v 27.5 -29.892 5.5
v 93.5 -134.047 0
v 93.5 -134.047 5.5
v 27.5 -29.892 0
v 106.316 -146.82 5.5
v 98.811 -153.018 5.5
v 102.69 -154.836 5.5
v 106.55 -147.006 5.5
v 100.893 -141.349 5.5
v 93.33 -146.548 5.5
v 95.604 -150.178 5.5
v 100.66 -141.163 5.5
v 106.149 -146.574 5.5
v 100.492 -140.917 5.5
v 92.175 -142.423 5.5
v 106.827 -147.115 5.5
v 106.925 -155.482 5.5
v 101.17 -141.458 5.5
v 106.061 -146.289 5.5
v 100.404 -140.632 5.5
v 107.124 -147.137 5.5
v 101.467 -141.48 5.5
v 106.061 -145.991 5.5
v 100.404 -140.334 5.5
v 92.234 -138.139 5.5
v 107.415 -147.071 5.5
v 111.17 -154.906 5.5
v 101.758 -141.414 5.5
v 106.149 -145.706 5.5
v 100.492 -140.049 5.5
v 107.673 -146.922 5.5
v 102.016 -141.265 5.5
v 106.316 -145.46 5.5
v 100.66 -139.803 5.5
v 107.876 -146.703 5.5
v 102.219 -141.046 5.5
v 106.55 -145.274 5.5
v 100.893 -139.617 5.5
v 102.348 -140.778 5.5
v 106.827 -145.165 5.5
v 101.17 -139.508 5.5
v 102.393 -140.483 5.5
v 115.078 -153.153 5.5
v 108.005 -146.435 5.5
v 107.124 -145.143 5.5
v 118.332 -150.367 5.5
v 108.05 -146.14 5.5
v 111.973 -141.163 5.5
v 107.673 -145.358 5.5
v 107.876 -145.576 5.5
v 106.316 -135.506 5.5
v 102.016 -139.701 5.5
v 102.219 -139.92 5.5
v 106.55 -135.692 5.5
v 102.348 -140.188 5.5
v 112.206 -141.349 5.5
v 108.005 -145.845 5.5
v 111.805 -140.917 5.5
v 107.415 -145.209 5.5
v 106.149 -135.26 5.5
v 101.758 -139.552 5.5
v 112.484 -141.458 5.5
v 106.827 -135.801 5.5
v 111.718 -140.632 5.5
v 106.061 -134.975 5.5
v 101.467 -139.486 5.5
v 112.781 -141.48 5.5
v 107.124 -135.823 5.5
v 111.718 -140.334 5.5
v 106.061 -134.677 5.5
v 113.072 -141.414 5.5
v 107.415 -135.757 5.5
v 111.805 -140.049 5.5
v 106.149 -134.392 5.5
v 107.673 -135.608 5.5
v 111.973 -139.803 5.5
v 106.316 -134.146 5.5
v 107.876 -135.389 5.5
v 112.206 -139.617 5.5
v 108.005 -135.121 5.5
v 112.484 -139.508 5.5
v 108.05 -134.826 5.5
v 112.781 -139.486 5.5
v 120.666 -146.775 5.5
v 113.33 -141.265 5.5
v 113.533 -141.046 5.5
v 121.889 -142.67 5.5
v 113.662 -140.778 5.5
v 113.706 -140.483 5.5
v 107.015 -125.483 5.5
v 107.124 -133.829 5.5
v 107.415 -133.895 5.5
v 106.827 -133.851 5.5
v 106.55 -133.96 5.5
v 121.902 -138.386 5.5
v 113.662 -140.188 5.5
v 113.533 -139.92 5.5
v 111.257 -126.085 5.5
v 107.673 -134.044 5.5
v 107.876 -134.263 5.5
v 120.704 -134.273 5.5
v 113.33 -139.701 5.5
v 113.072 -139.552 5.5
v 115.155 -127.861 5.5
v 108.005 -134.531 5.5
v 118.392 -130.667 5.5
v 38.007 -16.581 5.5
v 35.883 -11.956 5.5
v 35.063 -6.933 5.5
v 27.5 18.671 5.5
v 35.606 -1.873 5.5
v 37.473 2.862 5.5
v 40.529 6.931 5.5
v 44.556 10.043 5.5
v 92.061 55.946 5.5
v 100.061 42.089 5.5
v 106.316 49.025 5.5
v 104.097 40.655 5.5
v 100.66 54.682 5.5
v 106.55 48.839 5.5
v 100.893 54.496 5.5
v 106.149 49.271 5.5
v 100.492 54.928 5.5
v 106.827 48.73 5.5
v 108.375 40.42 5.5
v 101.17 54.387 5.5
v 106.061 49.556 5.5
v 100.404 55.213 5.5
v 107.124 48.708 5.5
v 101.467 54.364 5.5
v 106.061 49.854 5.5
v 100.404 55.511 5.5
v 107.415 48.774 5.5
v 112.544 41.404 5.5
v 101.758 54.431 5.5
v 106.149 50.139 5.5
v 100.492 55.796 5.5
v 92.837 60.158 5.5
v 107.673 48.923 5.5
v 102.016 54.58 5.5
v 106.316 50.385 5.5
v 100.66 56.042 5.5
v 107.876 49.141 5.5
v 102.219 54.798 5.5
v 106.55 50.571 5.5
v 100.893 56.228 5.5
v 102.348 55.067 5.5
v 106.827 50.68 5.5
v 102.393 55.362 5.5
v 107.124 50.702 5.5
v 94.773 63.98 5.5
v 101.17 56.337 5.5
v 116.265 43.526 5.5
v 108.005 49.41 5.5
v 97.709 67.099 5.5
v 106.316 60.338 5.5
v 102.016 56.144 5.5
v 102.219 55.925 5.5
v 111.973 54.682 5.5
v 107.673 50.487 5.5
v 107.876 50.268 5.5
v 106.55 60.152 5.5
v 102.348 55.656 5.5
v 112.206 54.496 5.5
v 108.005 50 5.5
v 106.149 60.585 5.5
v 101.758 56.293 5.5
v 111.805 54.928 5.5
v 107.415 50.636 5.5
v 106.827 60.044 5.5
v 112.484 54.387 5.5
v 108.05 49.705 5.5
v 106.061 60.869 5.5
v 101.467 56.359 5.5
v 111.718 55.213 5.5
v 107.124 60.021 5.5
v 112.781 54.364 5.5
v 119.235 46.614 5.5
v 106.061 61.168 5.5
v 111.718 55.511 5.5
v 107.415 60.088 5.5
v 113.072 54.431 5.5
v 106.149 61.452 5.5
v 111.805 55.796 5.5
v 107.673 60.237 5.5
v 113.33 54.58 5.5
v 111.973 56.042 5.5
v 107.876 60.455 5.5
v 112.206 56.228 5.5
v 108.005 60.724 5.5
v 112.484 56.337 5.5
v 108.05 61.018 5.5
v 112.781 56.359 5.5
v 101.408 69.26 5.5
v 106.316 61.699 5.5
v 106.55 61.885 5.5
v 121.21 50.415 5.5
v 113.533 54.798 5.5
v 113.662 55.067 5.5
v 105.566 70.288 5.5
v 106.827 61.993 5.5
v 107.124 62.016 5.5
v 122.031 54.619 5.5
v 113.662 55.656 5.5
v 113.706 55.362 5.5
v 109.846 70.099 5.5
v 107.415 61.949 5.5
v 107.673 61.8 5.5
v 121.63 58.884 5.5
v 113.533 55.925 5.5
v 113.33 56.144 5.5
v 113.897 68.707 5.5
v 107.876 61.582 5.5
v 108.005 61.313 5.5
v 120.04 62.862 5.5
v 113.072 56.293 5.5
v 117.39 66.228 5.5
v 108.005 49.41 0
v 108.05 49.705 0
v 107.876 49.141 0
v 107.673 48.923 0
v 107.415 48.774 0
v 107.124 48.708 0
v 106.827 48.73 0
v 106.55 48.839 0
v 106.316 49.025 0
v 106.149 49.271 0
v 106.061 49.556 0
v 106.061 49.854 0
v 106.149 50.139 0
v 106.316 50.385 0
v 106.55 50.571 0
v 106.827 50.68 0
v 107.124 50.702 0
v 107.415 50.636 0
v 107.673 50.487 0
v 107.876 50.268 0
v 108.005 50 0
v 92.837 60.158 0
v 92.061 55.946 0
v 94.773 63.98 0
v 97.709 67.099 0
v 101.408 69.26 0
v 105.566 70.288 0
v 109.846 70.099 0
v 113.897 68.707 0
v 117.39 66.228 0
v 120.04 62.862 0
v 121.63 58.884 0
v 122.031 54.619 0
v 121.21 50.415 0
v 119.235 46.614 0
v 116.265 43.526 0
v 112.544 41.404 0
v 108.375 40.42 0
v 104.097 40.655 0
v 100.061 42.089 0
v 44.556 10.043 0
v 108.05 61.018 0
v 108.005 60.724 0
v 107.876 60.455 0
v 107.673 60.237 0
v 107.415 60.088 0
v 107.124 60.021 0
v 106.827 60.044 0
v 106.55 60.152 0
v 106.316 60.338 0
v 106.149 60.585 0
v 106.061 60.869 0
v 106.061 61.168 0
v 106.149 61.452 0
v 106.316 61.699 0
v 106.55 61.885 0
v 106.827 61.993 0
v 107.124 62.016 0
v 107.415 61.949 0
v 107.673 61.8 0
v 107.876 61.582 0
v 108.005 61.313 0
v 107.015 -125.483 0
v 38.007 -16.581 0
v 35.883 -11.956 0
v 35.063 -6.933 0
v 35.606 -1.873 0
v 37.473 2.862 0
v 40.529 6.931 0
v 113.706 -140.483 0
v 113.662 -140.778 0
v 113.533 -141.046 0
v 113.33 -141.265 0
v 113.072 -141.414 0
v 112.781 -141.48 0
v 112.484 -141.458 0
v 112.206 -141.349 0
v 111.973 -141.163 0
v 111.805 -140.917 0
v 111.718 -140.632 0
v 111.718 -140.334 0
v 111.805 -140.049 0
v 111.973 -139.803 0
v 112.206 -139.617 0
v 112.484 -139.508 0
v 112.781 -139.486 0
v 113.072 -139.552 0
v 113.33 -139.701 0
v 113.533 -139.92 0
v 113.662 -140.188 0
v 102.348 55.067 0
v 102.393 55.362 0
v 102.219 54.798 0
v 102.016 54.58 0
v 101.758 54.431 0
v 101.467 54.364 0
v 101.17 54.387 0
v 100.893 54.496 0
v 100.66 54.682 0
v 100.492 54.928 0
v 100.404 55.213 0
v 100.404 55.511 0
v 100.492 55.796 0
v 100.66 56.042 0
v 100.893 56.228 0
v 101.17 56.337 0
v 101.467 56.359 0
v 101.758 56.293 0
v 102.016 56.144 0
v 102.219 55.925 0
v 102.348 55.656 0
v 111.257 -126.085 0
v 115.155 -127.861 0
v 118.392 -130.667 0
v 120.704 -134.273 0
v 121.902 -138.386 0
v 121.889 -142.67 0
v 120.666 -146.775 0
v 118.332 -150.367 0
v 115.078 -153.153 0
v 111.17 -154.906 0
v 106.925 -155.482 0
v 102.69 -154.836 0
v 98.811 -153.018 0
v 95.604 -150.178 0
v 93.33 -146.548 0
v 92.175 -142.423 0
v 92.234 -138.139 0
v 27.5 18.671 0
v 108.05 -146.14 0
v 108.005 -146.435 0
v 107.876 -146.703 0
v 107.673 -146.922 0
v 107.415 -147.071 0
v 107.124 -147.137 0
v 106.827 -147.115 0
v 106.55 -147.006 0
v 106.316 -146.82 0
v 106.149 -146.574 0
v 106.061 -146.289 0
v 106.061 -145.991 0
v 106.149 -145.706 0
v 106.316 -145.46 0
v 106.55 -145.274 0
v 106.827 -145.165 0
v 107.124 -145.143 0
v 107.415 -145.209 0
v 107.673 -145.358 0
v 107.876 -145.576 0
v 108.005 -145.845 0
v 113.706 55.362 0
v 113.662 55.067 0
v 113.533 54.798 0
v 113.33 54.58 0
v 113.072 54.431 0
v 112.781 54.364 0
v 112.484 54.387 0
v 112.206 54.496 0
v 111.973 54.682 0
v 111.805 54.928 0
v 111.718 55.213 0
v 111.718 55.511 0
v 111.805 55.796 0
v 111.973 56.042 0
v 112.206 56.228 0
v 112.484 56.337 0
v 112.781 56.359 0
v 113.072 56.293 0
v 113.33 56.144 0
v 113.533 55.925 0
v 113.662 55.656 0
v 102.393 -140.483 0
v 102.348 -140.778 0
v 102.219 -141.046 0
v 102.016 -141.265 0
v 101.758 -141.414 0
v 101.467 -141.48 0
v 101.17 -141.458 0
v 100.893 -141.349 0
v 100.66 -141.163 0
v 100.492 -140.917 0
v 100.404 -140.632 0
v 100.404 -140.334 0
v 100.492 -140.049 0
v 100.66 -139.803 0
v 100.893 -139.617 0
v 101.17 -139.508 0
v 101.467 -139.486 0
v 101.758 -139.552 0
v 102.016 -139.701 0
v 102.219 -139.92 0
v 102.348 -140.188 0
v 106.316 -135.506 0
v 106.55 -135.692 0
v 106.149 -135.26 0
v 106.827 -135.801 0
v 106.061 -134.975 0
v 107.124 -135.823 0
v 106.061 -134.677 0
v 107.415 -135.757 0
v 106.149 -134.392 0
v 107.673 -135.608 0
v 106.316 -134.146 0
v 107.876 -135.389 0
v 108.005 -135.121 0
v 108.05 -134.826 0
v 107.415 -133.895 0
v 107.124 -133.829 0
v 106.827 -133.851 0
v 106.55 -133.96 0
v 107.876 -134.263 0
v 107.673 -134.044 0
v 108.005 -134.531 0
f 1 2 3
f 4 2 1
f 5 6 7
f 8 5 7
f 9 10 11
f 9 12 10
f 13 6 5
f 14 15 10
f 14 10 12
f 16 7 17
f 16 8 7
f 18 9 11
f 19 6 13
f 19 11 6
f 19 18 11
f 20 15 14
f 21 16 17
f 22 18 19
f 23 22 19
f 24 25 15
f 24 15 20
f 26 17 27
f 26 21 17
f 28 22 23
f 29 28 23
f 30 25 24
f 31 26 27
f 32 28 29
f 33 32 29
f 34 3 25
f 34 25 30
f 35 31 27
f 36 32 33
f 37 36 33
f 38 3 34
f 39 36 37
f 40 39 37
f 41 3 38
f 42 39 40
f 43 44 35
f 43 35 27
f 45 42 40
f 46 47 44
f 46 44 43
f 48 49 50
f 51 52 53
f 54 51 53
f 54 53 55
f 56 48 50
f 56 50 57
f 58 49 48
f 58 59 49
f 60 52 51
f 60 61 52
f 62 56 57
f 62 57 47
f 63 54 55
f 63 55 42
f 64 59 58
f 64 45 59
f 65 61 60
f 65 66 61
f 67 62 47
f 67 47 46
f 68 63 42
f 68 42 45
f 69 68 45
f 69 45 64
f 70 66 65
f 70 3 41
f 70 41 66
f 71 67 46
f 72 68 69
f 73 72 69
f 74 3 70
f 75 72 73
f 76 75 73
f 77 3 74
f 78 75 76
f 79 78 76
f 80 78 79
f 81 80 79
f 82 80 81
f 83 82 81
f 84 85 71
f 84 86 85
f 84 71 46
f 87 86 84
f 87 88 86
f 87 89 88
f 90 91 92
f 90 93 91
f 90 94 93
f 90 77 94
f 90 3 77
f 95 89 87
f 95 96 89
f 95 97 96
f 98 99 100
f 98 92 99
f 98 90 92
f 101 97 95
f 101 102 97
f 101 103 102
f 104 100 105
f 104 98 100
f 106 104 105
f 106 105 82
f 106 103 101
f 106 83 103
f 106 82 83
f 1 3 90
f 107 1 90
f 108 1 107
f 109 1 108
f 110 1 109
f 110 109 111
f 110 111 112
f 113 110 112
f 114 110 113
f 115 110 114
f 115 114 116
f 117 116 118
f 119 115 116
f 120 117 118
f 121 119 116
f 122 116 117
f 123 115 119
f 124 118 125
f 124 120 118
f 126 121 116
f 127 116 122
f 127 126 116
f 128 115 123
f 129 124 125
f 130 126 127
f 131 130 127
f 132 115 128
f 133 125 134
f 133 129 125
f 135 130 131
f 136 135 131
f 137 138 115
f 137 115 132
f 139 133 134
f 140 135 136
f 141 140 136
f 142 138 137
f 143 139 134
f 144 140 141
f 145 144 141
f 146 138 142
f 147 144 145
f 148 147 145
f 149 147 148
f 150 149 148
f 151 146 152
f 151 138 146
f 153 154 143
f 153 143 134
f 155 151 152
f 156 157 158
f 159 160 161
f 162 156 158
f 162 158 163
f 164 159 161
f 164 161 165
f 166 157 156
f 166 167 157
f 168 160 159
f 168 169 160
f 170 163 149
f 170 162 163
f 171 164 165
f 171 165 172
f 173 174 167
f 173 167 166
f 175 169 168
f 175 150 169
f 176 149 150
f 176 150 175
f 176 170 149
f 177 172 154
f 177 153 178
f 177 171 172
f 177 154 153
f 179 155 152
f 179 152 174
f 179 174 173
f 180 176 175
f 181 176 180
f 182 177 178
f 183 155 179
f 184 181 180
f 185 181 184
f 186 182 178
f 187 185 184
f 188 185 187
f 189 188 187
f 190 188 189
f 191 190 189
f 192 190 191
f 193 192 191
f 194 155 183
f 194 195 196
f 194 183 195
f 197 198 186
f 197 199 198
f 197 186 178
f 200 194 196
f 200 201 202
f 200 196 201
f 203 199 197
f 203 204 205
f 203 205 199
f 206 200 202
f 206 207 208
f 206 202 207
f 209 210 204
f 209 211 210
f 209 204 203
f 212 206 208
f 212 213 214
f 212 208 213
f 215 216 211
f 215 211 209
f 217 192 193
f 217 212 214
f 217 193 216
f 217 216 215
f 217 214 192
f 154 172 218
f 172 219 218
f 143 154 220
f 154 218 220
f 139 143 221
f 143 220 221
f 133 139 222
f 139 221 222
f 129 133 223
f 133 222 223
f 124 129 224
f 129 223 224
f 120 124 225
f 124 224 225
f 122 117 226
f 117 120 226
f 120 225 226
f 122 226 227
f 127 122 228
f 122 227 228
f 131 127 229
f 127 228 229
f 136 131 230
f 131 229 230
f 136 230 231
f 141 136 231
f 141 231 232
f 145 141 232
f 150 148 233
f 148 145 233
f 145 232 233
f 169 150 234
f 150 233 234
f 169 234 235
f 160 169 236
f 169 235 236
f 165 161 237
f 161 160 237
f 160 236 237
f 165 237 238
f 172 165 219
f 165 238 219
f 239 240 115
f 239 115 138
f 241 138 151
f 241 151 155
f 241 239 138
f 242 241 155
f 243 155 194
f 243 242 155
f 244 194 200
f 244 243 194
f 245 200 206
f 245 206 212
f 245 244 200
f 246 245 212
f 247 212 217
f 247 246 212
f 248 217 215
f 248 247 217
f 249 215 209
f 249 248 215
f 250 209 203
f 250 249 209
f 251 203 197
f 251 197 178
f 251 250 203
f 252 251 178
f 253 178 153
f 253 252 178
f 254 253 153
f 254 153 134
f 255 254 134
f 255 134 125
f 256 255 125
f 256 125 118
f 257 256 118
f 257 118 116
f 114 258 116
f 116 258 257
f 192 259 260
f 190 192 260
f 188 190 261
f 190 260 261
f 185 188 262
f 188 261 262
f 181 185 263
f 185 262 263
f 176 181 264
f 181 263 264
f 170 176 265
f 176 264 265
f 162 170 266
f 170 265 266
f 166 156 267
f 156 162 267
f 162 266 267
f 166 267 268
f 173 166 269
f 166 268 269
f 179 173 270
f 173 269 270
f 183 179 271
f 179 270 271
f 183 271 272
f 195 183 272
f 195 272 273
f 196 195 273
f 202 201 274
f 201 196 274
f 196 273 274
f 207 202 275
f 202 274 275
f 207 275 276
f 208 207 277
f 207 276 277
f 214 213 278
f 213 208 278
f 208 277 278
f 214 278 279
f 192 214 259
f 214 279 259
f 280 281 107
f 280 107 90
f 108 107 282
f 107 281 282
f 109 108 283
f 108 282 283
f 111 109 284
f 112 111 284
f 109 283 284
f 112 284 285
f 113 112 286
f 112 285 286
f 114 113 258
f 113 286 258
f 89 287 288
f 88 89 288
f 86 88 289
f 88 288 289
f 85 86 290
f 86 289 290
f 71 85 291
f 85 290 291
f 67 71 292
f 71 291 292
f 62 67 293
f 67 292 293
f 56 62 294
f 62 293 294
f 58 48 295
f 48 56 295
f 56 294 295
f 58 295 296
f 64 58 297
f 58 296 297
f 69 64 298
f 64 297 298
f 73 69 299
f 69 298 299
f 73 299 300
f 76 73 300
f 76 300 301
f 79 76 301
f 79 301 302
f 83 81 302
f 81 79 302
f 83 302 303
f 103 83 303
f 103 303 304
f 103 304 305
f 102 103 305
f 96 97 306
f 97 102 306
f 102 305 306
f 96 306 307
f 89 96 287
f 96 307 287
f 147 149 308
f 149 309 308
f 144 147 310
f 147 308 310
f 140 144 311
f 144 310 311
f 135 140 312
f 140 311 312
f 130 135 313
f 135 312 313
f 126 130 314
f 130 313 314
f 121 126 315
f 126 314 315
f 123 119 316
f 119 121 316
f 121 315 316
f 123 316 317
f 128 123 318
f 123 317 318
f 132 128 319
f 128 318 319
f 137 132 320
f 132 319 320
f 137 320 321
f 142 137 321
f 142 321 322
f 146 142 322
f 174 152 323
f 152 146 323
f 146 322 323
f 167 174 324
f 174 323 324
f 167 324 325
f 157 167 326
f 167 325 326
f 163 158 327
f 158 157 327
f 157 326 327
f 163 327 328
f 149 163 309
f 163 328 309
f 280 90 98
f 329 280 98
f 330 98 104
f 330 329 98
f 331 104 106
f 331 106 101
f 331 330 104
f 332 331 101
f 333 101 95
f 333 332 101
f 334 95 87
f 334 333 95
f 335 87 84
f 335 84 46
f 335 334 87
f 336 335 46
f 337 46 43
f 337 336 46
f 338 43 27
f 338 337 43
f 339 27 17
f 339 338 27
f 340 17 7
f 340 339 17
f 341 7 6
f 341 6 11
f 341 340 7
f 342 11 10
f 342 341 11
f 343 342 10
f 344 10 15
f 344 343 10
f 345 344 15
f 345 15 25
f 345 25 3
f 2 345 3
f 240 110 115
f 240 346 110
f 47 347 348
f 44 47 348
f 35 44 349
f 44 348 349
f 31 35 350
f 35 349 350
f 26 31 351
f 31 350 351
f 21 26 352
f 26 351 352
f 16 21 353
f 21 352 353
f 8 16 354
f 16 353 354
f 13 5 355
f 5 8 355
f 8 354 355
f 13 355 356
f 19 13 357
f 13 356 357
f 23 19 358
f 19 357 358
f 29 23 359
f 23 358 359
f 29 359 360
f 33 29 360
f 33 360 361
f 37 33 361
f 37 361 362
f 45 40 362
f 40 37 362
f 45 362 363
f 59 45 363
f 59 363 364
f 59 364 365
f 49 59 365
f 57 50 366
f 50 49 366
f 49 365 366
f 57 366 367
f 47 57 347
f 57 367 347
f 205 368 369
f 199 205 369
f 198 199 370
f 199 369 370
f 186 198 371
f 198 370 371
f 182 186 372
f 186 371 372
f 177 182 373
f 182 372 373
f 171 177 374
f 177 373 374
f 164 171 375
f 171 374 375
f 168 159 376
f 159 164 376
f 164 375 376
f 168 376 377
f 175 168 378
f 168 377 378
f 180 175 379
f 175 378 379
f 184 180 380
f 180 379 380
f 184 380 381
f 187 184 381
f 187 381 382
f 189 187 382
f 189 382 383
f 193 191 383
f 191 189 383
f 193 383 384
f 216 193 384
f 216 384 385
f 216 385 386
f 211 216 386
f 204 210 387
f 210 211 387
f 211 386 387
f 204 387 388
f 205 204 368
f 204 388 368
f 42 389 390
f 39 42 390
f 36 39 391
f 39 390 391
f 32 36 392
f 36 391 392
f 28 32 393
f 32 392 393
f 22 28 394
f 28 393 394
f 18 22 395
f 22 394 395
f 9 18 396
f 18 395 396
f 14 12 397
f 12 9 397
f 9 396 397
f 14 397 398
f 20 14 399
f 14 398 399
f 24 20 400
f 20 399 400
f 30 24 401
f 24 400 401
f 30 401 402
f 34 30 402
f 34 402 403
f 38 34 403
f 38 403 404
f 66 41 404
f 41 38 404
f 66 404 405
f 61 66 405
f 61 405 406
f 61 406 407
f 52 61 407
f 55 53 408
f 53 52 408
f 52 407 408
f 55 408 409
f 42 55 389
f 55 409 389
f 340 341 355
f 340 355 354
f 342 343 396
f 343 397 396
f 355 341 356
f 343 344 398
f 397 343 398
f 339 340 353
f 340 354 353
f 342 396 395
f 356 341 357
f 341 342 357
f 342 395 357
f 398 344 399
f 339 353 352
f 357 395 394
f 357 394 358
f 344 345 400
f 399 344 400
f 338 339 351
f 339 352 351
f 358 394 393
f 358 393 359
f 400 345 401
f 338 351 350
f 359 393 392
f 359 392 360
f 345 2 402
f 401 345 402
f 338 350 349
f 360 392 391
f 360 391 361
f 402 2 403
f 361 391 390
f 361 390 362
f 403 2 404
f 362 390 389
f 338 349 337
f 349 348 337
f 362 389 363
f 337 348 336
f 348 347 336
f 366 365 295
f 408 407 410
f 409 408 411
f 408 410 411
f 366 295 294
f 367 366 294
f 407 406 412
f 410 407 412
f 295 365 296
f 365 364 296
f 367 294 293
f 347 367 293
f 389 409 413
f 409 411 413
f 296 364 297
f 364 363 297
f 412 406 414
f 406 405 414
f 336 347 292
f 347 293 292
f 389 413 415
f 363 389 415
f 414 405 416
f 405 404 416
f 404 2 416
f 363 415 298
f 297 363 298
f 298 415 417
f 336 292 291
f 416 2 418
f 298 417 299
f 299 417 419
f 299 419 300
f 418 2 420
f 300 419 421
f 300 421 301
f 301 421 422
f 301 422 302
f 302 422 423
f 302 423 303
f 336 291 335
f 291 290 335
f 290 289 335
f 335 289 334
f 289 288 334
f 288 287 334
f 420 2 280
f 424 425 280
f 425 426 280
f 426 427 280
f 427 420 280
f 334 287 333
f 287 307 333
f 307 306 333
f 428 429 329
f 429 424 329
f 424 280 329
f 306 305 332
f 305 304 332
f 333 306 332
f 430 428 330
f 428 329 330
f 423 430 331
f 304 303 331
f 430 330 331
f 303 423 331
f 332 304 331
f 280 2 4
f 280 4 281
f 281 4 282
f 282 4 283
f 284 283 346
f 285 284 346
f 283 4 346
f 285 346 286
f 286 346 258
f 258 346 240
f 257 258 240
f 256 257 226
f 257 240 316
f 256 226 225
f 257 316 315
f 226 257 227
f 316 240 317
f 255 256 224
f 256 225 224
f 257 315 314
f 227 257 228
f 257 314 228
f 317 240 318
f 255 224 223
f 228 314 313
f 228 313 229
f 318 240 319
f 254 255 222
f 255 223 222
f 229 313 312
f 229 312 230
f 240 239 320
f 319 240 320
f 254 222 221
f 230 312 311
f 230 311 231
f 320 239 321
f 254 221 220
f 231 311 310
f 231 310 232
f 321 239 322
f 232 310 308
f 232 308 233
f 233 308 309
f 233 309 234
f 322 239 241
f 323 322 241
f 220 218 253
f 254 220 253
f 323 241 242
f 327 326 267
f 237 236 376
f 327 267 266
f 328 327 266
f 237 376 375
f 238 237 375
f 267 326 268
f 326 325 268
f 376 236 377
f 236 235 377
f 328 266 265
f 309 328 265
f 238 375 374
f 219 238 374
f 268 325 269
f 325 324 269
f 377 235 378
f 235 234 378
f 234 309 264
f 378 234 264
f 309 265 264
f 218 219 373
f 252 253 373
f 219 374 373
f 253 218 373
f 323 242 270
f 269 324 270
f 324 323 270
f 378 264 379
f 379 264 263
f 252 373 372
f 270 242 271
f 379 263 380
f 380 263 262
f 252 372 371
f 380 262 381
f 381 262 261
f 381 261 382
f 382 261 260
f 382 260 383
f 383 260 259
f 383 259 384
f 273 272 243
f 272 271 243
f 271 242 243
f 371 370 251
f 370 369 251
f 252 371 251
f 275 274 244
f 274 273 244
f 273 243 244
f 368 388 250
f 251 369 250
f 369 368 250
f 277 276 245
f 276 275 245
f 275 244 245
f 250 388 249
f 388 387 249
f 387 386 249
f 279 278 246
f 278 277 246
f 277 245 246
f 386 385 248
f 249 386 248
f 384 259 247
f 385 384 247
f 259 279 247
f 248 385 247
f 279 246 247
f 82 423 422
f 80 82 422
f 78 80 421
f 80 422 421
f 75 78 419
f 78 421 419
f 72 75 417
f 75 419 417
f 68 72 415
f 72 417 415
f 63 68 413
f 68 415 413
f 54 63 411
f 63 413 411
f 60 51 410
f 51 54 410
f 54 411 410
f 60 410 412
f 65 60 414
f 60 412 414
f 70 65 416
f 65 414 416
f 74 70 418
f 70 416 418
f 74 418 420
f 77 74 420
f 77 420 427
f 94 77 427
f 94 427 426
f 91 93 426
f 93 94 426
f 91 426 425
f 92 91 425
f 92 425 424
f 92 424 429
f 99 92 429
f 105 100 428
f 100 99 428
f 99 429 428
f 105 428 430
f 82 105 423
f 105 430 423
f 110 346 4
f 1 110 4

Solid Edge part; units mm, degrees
sketch "Sketch1" plane through (0, 0, 0) normal (0, 0, 1) x (1, 0, 0)
  line L0 (44.556, 10.0434) -> (100.0609, 42.0892)
  line L1 (27.5, 18.6713) -> (92.0609, 55.9456)
  line L2 (27.5, 18.6713) -> (27.5, -29.8921)
  line L3 (93.5003, -134.0471) -> (27.5, -29.8921)
  line L4 (38.0069, -16.5809) -> (107.0154, -125.483)
  arc A0 (38.0069, -16.5809) -> (44.556, 10.0434) centre (54.056, -6.4111) cw
  arc A1 (92.0609, 55.9456) -> (100.0609, 42.0892) centre (107.0495, 55.3617) cw
  arc A2 (107.0154, -125.483) -> (93.5003, -134.0471) centre (107.0495, -140.483) cw
  circle A3 centre (107.0495, 49.7048) radius 1
  circle A4 centre (101.3927, 55.3617) radius 1
  circle A5 centre (107.0495, 61.0185) radius 1
  circle A6 centre (112.7064, 55.3617) radius 1
  circle A7 centre (101.3927, -140.483) radius 1
  circle A8 centre (107.0495, -134.8261) radius 1
  circle A9 centre (112.7064, -140.483) radius 1
  circle A10 centre (107.0495, -146.1398) radius 1
extrude "Protrusion1" add sketch "Sketch1" along normal blind 5.5
